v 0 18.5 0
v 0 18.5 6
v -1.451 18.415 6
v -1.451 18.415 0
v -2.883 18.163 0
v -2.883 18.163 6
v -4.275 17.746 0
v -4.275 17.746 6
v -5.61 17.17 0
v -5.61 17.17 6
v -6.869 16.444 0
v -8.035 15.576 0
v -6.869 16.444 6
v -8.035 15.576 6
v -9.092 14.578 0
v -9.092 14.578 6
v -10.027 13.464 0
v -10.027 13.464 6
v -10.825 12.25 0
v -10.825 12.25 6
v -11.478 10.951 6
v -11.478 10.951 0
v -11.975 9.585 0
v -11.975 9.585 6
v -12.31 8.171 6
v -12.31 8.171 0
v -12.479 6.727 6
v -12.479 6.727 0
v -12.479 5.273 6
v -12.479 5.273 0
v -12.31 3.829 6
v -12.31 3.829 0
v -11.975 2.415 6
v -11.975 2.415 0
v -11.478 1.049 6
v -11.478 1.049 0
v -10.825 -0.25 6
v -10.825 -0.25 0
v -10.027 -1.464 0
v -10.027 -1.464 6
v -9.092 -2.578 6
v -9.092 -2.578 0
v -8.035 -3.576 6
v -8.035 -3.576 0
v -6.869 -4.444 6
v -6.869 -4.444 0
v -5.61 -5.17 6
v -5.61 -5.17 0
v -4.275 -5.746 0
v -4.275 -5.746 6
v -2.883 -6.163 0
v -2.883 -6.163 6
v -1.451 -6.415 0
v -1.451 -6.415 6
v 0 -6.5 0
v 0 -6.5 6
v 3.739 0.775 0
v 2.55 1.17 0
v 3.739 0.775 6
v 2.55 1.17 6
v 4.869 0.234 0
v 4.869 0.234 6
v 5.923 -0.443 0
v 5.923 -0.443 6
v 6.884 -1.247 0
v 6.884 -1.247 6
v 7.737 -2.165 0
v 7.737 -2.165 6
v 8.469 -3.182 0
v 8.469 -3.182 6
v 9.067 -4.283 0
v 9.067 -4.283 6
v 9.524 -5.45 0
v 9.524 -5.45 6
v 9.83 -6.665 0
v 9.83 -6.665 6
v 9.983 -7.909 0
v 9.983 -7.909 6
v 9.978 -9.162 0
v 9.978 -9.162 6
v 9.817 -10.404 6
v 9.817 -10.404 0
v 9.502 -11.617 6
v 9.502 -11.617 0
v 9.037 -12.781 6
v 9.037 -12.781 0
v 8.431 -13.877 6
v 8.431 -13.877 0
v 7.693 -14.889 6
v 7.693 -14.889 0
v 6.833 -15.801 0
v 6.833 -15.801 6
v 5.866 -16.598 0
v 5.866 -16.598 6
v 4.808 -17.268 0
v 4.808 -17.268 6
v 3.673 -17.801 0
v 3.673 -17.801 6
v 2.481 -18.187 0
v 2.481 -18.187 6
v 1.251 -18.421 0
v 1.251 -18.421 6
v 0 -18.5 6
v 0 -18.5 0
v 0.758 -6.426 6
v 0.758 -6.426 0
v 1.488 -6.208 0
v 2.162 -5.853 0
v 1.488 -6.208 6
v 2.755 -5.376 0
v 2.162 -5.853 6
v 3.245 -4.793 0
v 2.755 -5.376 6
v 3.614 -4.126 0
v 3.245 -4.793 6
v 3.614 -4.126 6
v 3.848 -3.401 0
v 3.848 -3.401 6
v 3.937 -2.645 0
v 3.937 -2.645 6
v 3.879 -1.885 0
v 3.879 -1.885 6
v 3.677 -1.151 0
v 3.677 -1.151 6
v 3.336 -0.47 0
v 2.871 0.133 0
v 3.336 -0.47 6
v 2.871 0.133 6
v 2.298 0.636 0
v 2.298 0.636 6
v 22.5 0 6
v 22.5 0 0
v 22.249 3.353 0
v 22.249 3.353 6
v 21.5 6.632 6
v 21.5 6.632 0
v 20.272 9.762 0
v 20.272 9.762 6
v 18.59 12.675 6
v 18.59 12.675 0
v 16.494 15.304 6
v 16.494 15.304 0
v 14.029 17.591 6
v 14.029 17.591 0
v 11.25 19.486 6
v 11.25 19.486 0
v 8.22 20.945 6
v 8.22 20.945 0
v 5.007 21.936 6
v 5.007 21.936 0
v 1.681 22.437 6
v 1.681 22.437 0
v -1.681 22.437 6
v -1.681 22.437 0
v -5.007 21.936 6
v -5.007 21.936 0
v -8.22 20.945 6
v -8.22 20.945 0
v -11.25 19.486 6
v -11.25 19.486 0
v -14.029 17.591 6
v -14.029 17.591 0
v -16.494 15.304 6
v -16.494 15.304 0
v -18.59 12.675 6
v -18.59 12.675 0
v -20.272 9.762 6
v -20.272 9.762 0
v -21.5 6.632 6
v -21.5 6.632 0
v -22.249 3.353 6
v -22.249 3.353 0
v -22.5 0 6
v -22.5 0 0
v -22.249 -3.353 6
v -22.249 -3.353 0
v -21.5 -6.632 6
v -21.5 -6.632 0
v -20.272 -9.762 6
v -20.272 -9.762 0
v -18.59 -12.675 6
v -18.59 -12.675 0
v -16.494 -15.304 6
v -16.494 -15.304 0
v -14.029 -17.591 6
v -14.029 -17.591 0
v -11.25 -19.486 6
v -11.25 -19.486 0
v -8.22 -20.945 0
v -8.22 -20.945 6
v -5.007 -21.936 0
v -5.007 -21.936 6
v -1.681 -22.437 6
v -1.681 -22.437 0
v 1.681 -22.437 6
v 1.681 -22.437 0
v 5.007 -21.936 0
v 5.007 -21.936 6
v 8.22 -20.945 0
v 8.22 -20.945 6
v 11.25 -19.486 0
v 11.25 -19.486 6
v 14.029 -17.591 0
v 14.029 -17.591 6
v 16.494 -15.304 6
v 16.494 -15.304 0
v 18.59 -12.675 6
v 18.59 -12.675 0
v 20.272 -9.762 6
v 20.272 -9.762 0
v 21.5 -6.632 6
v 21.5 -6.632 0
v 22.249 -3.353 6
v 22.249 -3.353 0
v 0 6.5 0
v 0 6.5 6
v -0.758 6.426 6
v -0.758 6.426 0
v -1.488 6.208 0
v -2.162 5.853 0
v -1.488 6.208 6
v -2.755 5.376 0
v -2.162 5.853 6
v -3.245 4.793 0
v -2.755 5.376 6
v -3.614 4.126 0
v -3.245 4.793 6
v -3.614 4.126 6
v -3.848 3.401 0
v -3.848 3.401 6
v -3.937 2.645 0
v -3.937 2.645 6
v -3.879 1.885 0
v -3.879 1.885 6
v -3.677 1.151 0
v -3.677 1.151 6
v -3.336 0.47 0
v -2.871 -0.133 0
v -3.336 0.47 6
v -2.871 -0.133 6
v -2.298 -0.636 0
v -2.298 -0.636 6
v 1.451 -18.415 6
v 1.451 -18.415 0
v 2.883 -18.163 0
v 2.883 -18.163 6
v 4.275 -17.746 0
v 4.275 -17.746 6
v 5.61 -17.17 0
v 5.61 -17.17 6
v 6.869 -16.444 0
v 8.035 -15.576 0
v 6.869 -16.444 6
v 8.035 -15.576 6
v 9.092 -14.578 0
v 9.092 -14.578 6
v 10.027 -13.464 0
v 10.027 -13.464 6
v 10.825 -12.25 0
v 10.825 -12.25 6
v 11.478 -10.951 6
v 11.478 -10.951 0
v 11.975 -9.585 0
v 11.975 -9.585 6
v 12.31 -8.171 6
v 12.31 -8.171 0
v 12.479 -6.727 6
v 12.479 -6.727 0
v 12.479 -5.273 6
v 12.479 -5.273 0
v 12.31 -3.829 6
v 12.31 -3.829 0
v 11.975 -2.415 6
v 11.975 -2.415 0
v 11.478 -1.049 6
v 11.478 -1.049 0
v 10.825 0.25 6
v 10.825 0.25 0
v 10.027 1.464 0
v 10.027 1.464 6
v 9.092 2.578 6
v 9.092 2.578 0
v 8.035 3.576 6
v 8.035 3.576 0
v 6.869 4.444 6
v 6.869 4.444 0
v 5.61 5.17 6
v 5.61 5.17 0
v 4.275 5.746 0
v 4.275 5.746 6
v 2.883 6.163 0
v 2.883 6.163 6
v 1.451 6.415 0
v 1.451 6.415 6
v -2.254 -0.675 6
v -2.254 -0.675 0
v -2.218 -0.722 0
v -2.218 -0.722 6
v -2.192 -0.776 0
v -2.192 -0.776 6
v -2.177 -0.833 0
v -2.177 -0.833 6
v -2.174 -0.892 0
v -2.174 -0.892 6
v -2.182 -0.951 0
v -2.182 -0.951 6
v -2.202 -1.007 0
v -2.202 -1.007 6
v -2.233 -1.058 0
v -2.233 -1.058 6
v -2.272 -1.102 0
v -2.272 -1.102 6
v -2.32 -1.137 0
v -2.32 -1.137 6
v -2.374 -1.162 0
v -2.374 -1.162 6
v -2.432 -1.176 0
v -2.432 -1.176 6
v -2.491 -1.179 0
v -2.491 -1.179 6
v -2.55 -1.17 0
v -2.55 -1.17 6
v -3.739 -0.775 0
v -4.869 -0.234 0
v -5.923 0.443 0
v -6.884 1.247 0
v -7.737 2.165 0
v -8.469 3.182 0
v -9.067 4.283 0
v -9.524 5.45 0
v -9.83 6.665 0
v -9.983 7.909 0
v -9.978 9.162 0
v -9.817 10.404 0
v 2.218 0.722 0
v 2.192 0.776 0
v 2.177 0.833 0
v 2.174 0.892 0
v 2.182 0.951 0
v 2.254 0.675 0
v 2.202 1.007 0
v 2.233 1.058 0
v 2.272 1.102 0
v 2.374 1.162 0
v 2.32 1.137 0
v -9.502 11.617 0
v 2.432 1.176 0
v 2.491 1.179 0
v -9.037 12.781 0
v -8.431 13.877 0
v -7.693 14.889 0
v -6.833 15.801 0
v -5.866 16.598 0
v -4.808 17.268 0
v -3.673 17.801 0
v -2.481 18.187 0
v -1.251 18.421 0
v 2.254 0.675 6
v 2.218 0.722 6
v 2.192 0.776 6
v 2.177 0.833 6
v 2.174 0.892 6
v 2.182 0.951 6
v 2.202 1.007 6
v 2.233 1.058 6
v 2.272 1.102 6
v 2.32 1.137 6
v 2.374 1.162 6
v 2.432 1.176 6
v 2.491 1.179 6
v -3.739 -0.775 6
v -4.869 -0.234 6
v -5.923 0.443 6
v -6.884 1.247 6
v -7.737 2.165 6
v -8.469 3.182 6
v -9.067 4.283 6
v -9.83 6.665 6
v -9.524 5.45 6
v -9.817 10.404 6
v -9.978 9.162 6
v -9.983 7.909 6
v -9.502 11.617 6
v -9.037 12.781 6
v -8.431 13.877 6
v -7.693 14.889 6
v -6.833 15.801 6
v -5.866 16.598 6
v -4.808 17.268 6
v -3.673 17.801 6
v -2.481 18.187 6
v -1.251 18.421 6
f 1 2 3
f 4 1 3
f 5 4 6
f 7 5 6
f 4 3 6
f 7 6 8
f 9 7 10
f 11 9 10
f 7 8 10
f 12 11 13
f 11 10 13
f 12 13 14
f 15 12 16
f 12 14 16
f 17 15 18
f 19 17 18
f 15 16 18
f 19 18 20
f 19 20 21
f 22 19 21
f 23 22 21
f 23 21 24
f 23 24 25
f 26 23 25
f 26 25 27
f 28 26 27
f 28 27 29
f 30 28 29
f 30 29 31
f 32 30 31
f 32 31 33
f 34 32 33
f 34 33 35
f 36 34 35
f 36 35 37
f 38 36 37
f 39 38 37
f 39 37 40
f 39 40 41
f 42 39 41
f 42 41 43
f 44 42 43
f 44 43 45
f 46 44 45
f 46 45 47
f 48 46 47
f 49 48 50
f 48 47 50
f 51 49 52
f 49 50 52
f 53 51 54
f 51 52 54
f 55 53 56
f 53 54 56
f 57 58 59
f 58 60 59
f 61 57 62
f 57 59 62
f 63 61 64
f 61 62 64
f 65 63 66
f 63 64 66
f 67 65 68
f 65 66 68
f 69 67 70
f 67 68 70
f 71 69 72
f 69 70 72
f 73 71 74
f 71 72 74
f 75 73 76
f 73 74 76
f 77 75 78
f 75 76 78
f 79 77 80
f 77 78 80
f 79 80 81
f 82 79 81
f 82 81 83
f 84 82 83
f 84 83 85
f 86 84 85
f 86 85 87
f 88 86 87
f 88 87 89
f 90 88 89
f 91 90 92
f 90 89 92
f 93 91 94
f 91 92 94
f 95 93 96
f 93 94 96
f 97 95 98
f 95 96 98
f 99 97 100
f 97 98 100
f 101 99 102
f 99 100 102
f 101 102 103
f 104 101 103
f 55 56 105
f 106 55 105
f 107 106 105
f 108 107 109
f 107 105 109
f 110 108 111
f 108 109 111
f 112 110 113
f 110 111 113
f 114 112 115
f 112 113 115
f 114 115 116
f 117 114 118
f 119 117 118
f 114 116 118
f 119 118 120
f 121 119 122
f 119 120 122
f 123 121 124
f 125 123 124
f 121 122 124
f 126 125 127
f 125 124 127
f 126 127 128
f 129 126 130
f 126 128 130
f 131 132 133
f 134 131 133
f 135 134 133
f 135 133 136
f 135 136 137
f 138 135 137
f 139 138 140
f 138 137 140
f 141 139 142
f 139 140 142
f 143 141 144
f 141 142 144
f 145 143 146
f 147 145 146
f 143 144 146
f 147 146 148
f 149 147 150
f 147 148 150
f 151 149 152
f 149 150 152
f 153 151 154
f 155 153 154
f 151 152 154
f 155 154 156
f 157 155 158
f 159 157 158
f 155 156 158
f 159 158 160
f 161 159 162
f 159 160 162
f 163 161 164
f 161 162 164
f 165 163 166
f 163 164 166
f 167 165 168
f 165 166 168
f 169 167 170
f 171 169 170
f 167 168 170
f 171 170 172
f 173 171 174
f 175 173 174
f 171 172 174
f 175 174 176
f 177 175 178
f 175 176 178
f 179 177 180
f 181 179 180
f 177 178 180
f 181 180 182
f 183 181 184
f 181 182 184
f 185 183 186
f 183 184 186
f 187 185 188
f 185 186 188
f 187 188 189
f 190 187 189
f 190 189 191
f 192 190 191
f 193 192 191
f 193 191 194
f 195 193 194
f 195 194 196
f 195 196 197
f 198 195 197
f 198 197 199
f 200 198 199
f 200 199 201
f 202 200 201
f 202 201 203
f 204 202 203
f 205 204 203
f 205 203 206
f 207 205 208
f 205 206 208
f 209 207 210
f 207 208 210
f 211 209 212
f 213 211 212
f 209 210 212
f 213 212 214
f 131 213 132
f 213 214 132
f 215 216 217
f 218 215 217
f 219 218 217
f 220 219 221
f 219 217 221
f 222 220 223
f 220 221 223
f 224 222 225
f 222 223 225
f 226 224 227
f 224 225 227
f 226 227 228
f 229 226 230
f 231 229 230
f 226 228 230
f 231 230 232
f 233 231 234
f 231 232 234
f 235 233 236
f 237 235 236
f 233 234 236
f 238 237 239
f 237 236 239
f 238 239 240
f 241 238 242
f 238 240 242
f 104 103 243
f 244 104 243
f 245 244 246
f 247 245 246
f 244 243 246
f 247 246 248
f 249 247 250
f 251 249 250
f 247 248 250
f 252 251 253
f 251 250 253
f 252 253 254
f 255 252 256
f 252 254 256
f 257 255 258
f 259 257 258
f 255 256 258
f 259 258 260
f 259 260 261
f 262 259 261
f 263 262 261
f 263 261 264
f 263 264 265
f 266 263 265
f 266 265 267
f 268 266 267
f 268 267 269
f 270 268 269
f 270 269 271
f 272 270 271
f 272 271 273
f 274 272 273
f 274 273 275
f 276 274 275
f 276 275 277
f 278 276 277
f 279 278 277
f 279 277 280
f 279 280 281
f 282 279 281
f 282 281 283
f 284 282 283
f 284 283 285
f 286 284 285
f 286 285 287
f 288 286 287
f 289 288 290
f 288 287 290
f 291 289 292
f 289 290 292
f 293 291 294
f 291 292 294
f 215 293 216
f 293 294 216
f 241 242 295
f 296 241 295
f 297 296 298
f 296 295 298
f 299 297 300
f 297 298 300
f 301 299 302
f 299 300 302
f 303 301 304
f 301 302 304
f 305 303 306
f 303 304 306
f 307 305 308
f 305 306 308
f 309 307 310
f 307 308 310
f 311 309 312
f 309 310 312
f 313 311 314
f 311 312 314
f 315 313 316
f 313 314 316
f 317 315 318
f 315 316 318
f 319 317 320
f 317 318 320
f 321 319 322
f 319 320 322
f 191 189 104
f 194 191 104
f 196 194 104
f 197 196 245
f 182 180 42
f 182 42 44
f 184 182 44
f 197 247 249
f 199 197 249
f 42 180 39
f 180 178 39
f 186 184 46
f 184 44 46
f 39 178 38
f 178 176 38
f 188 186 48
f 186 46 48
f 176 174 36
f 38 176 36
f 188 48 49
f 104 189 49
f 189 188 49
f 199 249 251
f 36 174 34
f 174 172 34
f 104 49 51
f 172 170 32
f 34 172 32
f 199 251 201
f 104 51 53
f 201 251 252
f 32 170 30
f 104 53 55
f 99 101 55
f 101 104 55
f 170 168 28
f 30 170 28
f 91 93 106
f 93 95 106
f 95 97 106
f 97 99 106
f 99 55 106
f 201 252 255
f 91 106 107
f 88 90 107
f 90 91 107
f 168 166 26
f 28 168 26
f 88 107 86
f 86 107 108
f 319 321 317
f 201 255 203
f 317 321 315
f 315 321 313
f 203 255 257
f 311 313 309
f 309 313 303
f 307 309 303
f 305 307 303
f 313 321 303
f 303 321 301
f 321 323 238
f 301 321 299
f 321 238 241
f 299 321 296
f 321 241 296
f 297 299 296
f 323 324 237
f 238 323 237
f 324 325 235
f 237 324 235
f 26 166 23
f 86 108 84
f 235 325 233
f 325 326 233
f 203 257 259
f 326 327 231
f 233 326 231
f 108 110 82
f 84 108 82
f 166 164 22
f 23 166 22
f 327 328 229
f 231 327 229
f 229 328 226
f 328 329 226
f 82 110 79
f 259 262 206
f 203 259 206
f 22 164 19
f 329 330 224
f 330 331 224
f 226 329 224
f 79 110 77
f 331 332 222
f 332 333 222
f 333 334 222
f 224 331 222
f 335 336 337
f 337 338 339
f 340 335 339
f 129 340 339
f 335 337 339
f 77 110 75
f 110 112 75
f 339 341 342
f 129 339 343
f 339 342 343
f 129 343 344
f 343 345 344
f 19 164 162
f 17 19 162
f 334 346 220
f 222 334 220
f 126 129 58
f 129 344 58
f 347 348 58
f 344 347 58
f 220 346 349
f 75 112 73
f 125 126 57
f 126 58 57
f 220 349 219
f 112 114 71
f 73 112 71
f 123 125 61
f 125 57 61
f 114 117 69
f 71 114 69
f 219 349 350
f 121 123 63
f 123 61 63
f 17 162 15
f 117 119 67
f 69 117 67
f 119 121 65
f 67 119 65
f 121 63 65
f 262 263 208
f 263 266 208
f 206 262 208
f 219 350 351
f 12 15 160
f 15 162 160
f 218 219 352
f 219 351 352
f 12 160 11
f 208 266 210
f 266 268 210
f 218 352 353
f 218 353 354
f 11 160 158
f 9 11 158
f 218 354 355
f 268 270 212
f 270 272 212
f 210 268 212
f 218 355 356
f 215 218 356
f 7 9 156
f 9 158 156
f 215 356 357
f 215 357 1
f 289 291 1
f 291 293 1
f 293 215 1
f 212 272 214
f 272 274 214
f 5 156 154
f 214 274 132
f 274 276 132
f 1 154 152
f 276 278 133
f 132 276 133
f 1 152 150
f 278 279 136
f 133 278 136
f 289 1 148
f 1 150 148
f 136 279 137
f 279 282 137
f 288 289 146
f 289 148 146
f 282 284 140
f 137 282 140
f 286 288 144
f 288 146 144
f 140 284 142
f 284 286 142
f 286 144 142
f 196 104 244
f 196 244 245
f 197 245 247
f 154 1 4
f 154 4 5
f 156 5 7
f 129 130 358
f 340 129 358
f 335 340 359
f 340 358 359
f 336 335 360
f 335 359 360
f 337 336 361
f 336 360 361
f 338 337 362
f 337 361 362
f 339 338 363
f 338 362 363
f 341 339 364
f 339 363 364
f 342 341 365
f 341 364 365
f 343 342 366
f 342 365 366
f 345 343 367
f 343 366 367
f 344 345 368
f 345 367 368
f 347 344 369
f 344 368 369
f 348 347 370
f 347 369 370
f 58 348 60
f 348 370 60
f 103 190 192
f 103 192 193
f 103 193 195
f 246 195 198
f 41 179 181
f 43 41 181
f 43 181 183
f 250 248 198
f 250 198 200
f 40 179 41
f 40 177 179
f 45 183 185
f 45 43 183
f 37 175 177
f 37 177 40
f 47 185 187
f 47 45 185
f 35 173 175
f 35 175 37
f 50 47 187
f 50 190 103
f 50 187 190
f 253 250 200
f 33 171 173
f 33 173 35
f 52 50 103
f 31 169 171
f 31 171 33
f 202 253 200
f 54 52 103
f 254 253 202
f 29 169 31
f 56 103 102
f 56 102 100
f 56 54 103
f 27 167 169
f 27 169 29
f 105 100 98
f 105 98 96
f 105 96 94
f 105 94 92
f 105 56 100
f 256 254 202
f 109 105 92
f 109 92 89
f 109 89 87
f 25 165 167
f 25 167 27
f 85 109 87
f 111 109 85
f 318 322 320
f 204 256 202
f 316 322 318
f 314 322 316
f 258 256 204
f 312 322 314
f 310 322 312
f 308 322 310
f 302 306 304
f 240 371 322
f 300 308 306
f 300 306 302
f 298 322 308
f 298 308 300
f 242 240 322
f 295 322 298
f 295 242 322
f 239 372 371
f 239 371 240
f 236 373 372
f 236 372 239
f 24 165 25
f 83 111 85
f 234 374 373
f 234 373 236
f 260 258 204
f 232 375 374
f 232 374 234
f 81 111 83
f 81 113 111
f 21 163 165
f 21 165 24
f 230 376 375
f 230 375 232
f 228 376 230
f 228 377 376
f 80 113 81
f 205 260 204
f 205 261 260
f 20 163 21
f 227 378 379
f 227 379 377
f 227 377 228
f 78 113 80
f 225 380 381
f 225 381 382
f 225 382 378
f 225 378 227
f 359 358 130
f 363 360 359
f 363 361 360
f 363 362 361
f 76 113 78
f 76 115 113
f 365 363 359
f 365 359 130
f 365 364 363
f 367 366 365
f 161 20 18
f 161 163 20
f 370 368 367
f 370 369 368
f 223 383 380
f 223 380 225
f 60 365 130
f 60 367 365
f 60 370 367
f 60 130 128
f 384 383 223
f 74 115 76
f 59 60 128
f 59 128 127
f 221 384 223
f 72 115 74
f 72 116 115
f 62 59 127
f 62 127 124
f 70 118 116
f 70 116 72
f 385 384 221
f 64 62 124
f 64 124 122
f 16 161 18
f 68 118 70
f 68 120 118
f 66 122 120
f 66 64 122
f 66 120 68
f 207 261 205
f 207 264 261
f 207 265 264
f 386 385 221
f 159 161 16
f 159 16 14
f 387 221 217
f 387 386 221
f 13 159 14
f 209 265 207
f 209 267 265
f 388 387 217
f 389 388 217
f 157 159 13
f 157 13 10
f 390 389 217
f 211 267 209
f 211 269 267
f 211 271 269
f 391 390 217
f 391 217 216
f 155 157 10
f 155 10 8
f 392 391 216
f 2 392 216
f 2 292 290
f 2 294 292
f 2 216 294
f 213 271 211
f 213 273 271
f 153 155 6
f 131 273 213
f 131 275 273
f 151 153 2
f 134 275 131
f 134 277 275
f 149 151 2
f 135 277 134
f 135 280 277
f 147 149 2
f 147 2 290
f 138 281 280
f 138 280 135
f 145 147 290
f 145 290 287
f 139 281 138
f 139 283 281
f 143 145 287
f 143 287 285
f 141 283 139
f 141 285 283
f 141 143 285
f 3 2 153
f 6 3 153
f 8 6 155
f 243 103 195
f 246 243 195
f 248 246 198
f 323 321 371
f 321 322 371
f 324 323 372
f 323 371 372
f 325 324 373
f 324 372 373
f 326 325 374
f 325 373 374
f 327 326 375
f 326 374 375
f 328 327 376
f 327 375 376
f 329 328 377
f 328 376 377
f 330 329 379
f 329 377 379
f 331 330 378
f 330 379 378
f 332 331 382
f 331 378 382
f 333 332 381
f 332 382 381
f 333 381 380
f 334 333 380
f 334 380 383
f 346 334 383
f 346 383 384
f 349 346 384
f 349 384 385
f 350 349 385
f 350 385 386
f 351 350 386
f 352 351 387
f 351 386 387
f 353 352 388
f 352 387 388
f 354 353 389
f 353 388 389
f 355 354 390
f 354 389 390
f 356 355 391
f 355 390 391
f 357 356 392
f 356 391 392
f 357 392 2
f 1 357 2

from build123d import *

# Parameters (mm, degrees)
F0_R     = 22.5
F1_DEPTH = 6
F3_DEPTH = 25
F5_DEPTH = 25


with BuildPart() as f1:
    # F0 (on Top) → F1 (new body)
    with BuildSketch(Plane.XY):
        Circle(F0_R)
    extrude(amount=F1_DEPTH)

    # F2 (on face) → F3 (cut)
    with BuildSketch(Plane.XY.offset(6)):
        with BuildLine():
            ThreePointArc((0, 18.5), (-12.5, 6), (0, -6.5))
            ThreePointArc((0, -6.5), (2.5, -4), (0, -1.5))
            ThreePointArc((0, -1.5), (-10, 8.5), (0, 18.5))
        make_face()
        with BuildLine():
            ThreePointArc((0, 1.5), (10, -8.5), (0, -18.5))
            ThreePointArc((0, -18.5), (12.5, -6), (0, 6.5))
            ThreePointArc((0, 6.5), (-2.5, 4), (0, 1.5))
        make_face()
    extrude(amount=-F3_DEPTH, mode=Mode.SUBTRACT)

    # F4 (on face) → F5 (cut)
    with BuildSketch(Plane.XY.offset(6)):
        with BuildLine():
            ThreePointArc((2.298482, 0.635708), (2.202225, 1.007236), (2.550083, 1.169389))
            ThreePointArc((2.550083, 1.169389), (1.285713, 1.417003), (0, 1.5))
            Line((0, 1.5), (0, -1.5))
            ThreePointArc((0, -1.5), (-2.5, -4), (0, -6.5))
            ThreePointArc((0, -6.5), (3.748378, -3.769354), (2.298482, 0.635708))
        make_face()
        with BuildLine():
            Line((0, -1.5), (0, 1.5))
            ThreePointArc((0, 1.5), (2.5, 4), (0, 6.5))
            ThreePointArc((0, 6.5), (-3.748378, 3.769354), (-2.298482, -0.635708))
            ThreePointArc((-2.298482, -0.635708), (-2.202225, -1.007236), (-2.550083, -1.169389))
            ThreePointArc((-2.550083, -1.169389), (-1.285713, -1.417003), (0, -1.5))
        make_face()
    extrude(amount=-F5_DEPTH, mode=Mode.SUBTRACT)


solid = f1.part
